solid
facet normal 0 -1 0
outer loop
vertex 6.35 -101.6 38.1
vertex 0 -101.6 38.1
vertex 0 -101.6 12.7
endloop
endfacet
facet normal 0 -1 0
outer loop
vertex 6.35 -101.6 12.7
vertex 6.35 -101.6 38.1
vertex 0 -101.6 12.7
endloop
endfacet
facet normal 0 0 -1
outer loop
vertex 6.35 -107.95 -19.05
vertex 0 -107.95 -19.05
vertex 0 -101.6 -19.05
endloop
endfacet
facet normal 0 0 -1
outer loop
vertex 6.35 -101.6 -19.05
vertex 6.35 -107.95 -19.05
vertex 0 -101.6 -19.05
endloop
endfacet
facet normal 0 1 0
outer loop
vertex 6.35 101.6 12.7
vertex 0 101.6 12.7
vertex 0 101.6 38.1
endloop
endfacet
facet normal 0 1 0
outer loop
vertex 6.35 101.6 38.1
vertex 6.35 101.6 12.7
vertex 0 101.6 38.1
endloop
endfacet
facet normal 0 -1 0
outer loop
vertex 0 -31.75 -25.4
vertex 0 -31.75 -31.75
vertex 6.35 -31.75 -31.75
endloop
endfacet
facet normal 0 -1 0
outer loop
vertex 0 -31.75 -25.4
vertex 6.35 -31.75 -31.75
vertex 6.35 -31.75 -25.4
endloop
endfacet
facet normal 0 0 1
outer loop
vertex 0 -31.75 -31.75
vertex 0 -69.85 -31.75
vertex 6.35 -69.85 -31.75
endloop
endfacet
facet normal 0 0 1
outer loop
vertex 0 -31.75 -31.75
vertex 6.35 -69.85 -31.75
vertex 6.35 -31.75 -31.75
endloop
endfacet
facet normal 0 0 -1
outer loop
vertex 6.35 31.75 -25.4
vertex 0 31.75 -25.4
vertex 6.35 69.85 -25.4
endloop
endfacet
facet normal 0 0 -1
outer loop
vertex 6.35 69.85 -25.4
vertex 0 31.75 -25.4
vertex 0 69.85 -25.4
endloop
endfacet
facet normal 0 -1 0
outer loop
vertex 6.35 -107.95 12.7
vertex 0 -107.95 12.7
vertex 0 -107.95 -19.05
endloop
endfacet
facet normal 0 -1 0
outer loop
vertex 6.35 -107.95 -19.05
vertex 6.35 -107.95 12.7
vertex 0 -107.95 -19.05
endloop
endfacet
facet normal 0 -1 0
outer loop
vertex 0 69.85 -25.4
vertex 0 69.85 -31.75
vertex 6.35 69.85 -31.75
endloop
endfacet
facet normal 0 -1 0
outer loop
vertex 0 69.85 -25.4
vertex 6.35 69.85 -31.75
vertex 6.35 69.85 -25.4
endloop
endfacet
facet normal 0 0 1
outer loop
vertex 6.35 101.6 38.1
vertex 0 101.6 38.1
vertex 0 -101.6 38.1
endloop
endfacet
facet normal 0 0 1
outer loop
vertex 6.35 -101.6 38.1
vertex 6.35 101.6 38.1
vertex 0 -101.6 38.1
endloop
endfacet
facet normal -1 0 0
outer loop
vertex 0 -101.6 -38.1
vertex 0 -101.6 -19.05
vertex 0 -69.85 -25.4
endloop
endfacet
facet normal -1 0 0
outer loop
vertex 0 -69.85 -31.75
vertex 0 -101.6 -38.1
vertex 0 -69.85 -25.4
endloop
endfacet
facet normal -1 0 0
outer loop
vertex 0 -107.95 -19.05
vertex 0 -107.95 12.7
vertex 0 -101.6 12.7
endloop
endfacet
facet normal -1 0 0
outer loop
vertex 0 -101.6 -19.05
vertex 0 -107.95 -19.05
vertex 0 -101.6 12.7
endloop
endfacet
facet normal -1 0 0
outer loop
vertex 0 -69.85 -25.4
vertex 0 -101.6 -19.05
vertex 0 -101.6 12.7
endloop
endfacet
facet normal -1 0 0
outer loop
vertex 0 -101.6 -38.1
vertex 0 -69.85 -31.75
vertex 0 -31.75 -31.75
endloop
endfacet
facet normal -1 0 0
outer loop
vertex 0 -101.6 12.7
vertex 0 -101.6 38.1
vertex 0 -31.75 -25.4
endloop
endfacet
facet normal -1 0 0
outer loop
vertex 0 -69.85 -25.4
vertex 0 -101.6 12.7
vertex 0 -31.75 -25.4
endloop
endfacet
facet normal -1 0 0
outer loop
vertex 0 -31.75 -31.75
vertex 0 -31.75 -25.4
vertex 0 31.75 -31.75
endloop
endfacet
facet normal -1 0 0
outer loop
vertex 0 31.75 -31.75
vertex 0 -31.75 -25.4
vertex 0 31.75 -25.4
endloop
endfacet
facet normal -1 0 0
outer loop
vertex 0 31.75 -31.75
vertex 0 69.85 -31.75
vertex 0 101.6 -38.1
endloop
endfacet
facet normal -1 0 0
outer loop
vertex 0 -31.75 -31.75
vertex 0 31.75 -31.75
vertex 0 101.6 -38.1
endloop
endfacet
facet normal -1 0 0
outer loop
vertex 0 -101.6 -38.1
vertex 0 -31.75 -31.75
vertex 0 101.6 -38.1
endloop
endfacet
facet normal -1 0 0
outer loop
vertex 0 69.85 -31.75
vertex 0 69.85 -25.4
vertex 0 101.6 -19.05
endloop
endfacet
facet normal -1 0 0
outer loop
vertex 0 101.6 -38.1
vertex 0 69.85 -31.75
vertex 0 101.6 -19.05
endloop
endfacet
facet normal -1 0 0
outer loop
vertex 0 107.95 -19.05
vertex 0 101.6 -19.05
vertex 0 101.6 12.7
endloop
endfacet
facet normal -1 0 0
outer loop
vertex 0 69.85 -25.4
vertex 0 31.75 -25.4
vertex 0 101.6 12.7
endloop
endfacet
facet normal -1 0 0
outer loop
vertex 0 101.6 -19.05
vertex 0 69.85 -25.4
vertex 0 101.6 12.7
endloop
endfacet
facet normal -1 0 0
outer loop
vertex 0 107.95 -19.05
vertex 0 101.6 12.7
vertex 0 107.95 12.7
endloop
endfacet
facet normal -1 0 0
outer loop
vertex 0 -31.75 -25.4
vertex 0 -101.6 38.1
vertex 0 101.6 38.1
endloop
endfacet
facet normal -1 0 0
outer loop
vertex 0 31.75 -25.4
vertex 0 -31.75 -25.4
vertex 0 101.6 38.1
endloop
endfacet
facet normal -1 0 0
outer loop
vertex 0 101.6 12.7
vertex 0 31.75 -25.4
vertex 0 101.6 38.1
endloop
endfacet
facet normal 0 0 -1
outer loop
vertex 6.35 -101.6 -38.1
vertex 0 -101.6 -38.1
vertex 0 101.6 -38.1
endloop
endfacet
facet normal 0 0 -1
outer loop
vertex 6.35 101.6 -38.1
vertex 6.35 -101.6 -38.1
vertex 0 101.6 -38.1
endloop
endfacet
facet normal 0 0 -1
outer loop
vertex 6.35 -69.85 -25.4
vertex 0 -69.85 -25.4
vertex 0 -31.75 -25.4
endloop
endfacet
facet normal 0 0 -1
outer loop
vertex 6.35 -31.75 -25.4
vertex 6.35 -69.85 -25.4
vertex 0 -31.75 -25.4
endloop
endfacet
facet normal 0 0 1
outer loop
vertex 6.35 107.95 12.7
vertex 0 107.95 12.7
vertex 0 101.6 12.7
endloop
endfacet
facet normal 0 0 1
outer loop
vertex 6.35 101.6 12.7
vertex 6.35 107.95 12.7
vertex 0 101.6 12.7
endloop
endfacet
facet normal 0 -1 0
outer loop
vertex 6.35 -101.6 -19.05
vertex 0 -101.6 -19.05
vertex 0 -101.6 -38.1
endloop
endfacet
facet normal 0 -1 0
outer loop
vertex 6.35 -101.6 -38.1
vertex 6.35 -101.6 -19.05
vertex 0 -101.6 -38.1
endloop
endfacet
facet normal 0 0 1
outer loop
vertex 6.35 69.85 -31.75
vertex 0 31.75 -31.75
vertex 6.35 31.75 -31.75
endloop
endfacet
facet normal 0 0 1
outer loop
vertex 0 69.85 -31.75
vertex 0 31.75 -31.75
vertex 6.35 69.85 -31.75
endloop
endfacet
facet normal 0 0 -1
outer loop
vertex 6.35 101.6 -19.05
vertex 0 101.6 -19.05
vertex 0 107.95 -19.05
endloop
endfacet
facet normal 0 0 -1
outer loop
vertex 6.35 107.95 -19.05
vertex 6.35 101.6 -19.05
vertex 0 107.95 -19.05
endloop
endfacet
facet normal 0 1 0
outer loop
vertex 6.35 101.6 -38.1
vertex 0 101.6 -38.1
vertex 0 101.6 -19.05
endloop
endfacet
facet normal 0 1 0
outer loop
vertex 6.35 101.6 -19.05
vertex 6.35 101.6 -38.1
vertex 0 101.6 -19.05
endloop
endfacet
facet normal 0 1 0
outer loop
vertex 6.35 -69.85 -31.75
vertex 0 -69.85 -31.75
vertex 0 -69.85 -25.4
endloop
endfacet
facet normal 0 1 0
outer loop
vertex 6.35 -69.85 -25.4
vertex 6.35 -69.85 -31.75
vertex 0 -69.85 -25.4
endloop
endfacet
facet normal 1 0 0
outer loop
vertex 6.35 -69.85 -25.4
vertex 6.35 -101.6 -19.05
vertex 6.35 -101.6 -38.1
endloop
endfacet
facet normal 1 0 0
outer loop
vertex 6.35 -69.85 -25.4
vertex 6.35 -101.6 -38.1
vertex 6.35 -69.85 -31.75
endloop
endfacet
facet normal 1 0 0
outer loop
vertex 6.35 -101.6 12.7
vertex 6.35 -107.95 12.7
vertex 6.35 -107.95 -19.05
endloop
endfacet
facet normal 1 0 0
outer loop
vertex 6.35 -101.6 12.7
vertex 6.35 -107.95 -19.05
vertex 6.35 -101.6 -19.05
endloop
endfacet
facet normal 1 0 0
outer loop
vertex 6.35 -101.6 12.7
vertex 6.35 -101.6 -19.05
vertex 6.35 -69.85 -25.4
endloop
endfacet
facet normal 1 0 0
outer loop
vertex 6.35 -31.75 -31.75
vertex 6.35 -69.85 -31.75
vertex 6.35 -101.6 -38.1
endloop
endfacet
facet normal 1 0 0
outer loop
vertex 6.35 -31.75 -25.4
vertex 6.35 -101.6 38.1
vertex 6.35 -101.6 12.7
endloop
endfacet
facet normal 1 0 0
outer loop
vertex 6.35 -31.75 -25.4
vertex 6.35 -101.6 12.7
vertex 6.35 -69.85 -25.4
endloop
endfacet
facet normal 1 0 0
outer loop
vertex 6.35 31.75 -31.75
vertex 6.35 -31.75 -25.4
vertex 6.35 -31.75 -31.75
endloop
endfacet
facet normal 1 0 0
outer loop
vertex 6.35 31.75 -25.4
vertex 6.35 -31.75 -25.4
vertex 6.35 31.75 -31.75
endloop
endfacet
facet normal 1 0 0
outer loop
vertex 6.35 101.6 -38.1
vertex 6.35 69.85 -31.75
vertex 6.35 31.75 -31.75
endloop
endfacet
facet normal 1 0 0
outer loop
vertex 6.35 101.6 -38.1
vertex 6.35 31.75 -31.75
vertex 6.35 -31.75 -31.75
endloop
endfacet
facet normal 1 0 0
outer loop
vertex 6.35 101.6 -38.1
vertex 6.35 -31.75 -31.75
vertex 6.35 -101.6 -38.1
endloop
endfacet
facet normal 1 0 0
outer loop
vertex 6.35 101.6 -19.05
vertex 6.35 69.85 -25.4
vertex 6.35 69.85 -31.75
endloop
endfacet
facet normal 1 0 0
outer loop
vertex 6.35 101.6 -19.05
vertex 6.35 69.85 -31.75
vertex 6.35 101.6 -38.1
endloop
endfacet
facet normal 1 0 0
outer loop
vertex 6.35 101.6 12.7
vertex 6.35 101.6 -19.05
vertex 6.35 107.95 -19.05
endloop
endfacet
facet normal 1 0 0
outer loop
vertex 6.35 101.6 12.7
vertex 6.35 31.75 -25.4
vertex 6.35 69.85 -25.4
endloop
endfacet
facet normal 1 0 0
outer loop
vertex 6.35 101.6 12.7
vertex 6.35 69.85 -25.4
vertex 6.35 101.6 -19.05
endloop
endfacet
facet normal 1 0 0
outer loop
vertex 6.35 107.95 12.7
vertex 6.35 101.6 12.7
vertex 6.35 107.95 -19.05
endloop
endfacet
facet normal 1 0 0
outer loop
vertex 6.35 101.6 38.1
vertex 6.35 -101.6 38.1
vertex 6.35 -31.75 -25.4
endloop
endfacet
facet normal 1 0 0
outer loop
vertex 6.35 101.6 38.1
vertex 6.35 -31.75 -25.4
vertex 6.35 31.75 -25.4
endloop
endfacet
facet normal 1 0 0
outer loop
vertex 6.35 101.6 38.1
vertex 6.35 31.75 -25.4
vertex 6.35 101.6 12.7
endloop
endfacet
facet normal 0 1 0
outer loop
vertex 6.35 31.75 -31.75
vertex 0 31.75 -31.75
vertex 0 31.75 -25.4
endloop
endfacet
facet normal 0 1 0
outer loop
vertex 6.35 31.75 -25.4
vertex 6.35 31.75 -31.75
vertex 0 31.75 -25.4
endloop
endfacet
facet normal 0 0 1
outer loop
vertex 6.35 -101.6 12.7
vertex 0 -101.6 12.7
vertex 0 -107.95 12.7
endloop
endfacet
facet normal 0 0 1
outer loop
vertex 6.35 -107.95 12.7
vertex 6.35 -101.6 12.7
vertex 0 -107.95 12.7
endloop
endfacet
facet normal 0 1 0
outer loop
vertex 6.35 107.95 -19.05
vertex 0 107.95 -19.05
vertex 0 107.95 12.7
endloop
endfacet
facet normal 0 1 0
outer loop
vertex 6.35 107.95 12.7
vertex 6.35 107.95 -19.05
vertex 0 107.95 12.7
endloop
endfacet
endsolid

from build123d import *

# Parameters (mm, degrees)
F0_W     = 38.1
F0_H     = 6.35
F1_DEPTH = 6.35


with BuildPart() as f1:
    # F0 (on Right) → F1 (new body)
    with BuildSketch(Plane.YZ):
        Polygon((101.6, 38.1), (-101.6, 38.1), (-101.6, 12.7), (-107.95, 12.7), (-107.95, -19.05), (-101.6, -19.05), (-101.6, -38.1), (101.6, -38.1), (101.6, -19.05), (107.95, -19.05), (107.95, 12.7), (101.6, 12.7), align=None)
        with Locations((-50.8, -28.575)):
            Rectangle(F0_W, F0_H, mode=Mode.SUBTRACT)
        with Locations((50.8, -28.575)):
            Rectangle(F0_W, F0_H, mode=Mode.SUBTRACT)
    extrude(amount=F1_DEPTH)


solid = f1.part
